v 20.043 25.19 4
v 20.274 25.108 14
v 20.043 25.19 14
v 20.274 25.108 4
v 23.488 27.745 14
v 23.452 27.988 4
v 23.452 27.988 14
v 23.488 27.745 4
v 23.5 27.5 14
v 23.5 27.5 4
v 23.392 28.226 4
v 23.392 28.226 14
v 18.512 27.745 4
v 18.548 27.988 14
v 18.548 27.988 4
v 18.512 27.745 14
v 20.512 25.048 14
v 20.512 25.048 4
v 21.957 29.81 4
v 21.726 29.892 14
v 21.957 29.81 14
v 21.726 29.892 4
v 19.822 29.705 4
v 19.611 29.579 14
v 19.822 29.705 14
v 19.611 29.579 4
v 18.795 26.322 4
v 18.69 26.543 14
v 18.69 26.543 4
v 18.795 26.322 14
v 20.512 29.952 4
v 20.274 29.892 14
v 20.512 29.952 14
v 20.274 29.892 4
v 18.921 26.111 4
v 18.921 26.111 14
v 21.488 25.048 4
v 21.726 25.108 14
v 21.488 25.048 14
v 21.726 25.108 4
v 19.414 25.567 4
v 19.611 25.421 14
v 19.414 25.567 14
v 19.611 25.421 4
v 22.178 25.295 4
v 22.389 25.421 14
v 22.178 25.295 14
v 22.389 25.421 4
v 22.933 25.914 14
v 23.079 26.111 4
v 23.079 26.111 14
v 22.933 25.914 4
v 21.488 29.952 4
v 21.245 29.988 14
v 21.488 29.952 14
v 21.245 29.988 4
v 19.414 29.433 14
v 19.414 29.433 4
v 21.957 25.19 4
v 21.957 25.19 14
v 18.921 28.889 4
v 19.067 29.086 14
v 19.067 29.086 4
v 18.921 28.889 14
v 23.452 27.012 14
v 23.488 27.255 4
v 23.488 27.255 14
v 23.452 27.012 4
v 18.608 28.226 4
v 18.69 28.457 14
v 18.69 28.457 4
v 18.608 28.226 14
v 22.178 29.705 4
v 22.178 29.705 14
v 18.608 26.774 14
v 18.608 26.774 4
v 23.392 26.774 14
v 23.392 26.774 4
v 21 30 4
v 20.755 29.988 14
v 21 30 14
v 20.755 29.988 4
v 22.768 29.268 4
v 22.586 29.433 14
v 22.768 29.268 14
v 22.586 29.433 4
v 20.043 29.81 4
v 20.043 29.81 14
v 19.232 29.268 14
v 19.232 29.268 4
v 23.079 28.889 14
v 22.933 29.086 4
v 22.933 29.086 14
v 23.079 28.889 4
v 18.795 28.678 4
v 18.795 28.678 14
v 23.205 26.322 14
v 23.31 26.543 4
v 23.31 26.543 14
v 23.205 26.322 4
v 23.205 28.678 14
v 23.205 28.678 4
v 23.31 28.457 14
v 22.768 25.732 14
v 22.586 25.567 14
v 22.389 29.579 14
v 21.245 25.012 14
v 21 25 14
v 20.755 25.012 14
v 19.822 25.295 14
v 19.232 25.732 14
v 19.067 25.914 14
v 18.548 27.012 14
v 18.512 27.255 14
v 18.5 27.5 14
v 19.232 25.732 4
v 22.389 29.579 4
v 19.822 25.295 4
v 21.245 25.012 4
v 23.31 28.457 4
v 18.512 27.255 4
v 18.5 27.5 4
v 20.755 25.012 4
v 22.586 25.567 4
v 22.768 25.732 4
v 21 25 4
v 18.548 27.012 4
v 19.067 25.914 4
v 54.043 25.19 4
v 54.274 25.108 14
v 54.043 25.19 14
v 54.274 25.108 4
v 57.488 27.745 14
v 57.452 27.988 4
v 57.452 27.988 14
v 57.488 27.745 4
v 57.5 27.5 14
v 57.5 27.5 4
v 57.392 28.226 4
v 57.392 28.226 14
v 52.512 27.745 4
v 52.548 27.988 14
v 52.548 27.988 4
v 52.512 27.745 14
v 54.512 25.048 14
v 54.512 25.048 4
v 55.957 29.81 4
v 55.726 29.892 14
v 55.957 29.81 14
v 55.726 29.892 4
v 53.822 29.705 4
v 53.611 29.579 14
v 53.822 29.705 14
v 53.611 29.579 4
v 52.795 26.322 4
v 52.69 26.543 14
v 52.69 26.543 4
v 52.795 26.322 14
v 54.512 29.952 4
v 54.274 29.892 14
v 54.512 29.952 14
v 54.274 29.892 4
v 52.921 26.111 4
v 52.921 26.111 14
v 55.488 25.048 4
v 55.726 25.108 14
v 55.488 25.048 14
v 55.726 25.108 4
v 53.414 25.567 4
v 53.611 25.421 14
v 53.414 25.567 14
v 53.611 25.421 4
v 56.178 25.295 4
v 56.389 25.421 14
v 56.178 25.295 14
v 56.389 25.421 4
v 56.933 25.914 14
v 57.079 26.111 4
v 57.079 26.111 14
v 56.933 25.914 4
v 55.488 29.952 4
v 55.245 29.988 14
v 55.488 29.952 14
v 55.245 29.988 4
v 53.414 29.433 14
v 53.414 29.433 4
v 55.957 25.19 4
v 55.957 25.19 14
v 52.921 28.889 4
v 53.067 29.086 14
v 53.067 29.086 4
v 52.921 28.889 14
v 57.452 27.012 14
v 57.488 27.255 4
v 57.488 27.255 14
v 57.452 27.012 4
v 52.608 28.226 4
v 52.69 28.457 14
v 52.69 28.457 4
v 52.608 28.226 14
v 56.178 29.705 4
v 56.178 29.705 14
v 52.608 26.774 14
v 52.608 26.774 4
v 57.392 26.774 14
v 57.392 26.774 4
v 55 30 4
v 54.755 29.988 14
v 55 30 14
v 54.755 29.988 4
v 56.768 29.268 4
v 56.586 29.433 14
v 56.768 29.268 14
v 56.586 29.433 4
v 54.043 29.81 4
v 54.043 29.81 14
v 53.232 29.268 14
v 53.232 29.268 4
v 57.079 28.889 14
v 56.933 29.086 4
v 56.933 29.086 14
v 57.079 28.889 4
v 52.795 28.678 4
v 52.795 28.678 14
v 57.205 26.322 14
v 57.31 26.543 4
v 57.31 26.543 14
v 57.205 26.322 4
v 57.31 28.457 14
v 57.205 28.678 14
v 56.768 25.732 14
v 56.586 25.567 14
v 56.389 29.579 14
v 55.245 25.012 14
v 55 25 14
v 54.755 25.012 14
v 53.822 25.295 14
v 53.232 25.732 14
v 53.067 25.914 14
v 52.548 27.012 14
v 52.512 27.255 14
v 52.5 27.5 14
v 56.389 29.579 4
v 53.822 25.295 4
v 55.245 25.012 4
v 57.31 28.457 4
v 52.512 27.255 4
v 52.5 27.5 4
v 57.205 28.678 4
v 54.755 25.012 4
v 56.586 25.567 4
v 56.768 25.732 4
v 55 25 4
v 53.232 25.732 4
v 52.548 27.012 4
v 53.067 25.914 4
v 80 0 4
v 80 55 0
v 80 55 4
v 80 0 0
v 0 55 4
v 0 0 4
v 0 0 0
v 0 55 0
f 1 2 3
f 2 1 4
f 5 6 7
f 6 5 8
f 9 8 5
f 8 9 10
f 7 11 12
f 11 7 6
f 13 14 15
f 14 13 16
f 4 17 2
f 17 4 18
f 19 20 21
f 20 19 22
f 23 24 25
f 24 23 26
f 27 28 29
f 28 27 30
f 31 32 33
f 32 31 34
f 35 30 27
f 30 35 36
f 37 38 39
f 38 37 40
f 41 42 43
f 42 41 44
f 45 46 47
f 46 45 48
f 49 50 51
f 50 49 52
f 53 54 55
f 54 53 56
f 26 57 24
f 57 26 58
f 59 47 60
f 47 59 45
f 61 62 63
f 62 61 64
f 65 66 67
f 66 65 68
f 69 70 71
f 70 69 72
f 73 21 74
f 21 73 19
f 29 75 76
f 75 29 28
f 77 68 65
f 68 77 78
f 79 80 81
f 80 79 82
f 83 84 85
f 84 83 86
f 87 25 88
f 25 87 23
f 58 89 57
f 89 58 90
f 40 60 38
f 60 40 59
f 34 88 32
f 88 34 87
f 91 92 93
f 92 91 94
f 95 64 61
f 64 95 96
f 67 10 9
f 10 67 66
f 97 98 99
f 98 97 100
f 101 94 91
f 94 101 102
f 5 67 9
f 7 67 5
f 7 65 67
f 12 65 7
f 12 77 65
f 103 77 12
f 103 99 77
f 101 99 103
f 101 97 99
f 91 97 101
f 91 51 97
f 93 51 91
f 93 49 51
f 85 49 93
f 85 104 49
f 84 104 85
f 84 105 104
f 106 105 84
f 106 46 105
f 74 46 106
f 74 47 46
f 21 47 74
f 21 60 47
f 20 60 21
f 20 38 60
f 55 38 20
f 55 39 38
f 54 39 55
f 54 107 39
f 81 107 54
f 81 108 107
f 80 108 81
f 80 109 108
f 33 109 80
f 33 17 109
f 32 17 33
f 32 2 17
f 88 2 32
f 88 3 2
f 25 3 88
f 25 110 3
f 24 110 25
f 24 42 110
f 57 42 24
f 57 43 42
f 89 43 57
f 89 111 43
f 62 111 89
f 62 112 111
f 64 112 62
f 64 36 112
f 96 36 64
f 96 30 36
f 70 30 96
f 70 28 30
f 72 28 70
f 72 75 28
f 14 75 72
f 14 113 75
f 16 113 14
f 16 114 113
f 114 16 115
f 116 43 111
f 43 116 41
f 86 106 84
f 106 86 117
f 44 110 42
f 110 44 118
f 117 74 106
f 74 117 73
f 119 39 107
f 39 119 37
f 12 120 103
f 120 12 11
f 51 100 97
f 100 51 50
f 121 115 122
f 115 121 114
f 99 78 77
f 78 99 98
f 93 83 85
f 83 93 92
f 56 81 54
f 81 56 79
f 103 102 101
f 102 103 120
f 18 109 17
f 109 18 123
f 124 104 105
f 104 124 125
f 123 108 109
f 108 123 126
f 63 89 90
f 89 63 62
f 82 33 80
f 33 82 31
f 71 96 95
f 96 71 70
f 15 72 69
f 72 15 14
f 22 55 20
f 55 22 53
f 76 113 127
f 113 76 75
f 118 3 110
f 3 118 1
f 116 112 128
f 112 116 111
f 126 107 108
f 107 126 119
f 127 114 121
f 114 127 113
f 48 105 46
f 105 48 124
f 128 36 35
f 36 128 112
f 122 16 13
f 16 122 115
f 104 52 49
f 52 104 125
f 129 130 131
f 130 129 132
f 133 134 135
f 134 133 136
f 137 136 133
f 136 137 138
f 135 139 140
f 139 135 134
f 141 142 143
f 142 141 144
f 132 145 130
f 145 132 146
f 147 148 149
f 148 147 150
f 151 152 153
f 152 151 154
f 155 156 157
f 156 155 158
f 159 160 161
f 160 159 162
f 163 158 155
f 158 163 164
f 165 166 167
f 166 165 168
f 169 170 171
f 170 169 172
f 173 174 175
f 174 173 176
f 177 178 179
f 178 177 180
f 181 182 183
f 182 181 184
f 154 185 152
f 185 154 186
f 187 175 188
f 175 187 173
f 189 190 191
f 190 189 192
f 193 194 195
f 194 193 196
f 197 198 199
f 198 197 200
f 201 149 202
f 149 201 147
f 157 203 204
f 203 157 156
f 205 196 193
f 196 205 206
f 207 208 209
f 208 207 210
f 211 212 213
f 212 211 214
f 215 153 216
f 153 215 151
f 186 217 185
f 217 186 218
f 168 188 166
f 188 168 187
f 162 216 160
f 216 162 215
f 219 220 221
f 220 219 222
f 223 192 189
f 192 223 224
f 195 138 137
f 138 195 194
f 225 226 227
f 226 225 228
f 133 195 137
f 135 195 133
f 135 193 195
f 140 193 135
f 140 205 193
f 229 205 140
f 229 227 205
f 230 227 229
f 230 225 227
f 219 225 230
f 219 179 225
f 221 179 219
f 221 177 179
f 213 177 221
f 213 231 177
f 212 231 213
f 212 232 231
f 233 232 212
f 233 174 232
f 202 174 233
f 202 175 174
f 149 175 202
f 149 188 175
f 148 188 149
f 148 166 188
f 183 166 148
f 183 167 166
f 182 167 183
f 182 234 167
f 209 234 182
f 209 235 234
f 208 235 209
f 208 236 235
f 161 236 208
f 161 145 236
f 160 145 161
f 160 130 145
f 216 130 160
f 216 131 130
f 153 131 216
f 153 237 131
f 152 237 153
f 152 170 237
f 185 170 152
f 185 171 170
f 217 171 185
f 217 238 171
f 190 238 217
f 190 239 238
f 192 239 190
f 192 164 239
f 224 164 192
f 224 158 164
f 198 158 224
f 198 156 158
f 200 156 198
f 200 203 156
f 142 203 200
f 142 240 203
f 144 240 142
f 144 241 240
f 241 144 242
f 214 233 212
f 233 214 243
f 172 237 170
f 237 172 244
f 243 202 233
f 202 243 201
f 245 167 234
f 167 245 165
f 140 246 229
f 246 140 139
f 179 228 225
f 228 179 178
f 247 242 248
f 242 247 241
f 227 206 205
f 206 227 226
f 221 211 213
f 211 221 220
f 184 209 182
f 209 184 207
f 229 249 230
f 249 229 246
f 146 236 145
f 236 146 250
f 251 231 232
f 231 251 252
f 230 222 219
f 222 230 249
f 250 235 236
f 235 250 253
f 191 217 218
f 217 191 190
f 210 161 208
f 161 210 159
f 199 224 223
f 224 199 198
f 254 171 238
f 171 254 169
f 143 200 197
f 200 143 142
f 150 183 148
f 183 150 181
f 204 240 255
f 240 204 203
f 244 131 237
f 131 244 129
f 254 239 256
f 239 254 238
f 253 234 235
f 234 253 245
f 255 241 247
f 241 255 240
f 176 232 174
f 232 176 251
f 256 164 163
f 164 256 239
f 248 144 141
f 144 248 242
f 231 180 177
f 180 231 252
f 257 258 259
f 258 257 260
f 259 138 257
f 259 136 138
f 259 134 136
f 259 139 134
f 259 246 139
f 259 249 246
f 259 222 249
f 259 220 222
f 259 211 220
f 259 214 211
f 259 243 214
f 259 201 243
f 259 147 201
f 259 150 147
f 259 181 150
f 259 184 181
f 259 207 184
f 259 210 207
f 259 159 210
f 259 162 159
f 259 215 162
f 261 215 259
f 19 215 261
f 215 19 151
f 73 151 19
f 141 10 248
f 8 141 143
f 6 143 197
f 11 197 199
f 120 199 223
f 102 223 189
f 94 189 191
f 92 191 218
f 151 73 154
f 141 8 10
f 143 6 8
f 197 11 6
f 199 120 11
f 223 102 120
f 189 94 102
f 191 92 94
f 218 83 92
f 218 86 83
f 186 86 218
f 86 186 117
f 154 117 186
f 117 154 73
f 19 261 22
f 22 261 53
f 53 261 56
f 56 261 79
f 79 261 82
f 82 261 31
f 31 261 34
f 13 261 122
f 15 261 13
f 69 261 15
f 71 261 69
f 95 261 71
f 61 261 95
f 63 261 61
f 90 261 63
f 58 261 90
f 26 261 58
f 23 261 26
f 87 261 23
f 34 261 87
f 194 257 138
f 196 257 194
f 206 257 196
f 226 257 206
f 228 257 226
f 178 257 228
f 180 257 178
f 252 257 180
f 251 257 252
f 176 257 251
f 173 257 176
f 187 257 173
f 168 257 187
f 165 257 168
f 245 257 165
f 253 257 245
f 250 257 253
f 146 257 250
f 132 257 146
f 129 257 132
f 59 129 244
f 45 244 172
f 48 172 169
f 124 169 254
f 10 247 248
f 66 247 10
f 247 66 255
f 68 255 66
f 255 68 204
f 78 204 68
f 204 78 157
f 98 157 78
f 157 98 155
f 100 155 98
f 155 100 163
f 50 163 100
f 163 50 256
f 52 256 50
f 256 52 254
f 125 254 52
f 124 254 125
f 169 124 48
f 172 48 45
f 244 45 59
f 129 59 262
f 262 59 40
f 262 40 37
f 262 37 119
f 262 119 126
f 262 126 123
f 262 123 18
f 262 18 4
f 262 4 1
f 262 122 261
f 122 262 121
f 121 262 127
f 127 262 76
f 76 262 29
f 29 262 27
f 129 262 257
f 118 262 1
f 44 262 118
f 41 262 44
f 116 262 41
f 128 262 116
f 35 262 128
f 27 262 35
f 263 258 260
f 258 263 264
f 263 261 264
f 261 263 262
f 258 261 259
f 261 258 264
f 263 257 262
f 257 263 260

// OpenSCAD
// T6 reference for the grader's self-check (test_grade.py): two module
// 1.5 involute spur gears (30 and 15 teeth) and a plate with two axles
// 34 apart. -D part="plate", "large_gear" or "small_gear". Overridden for
// the wrong variants: `dist`, `axle_d`, `bore`, `thick`, `plate_t`,
// `small_z` and `fat` (each tooth's half-angle grows by this many
// degrees at the pitch circle, so the teeth bind).
part = "plate";
m = 1.5;
pa = 20;
large_z = 30;
small_z = 15;
thick = 6;
bore = 5.4;
plate = [80, 55];
plate_t = 4;
axle_d = 5;
axle_h = 10;
dist = 34;
fat = 0;

function inv(a) = tan(a) * 180 / PI - a;  // involute function, degrees

// One gear's outline: for each tooth a radial flank from the root to the
// base circle, the involute to the tip, and back down the other side.
function gear_points(z, steps = 8) = let(
    rp = m * z / 2, rb = rp * cos(pa), ra = rp + m, rf = rp - 1.25 * m,
    psi = function(r) 90 / z + fat + inv(pa) - inv(acos(rb / r)),
    r0 = max(rb, rf),
    flank = [for (i = [0:steps]) r0 + (ra - r0) * i / steps]
) [for (k = [0:z - 1]) let(c = 360 * k / z) each concat(
    [rf * [cos(c - psi(r0)), sin(c - psi(r0))]],
    [for (r = flank) r * [cos(c - psi(r)), sin(c - psi(r))]],
    [for (i = [steps:-1:0]) let(r = flank[i]) r * [cos(c + psi(r)), sin(c + psi(r))]],
    [rf * [cos(c + psi(r0)), sin(c + psi(r0))]]
)];

module gear(z) linear_extrude(thick) difference() {
    polygon(gear_points(z));
    circle(d = bore, $fn = 64);
}

module plate() {
    cube([plate.x, plate.y, plate_t]);
    for (x = [plate.x / 2 - dist / 2 - 2, plate.x / 2 + dist / 2 - 2])
        translate([x, plate.y / 2, plate_t - 0.01]) cylinder(d = axle_d, h = axle_h + 0.01, $fn = 64);
}

if (part == "plate") plate();
else if (part == "large_gear") gear(large_z);
else gear(small_z);
